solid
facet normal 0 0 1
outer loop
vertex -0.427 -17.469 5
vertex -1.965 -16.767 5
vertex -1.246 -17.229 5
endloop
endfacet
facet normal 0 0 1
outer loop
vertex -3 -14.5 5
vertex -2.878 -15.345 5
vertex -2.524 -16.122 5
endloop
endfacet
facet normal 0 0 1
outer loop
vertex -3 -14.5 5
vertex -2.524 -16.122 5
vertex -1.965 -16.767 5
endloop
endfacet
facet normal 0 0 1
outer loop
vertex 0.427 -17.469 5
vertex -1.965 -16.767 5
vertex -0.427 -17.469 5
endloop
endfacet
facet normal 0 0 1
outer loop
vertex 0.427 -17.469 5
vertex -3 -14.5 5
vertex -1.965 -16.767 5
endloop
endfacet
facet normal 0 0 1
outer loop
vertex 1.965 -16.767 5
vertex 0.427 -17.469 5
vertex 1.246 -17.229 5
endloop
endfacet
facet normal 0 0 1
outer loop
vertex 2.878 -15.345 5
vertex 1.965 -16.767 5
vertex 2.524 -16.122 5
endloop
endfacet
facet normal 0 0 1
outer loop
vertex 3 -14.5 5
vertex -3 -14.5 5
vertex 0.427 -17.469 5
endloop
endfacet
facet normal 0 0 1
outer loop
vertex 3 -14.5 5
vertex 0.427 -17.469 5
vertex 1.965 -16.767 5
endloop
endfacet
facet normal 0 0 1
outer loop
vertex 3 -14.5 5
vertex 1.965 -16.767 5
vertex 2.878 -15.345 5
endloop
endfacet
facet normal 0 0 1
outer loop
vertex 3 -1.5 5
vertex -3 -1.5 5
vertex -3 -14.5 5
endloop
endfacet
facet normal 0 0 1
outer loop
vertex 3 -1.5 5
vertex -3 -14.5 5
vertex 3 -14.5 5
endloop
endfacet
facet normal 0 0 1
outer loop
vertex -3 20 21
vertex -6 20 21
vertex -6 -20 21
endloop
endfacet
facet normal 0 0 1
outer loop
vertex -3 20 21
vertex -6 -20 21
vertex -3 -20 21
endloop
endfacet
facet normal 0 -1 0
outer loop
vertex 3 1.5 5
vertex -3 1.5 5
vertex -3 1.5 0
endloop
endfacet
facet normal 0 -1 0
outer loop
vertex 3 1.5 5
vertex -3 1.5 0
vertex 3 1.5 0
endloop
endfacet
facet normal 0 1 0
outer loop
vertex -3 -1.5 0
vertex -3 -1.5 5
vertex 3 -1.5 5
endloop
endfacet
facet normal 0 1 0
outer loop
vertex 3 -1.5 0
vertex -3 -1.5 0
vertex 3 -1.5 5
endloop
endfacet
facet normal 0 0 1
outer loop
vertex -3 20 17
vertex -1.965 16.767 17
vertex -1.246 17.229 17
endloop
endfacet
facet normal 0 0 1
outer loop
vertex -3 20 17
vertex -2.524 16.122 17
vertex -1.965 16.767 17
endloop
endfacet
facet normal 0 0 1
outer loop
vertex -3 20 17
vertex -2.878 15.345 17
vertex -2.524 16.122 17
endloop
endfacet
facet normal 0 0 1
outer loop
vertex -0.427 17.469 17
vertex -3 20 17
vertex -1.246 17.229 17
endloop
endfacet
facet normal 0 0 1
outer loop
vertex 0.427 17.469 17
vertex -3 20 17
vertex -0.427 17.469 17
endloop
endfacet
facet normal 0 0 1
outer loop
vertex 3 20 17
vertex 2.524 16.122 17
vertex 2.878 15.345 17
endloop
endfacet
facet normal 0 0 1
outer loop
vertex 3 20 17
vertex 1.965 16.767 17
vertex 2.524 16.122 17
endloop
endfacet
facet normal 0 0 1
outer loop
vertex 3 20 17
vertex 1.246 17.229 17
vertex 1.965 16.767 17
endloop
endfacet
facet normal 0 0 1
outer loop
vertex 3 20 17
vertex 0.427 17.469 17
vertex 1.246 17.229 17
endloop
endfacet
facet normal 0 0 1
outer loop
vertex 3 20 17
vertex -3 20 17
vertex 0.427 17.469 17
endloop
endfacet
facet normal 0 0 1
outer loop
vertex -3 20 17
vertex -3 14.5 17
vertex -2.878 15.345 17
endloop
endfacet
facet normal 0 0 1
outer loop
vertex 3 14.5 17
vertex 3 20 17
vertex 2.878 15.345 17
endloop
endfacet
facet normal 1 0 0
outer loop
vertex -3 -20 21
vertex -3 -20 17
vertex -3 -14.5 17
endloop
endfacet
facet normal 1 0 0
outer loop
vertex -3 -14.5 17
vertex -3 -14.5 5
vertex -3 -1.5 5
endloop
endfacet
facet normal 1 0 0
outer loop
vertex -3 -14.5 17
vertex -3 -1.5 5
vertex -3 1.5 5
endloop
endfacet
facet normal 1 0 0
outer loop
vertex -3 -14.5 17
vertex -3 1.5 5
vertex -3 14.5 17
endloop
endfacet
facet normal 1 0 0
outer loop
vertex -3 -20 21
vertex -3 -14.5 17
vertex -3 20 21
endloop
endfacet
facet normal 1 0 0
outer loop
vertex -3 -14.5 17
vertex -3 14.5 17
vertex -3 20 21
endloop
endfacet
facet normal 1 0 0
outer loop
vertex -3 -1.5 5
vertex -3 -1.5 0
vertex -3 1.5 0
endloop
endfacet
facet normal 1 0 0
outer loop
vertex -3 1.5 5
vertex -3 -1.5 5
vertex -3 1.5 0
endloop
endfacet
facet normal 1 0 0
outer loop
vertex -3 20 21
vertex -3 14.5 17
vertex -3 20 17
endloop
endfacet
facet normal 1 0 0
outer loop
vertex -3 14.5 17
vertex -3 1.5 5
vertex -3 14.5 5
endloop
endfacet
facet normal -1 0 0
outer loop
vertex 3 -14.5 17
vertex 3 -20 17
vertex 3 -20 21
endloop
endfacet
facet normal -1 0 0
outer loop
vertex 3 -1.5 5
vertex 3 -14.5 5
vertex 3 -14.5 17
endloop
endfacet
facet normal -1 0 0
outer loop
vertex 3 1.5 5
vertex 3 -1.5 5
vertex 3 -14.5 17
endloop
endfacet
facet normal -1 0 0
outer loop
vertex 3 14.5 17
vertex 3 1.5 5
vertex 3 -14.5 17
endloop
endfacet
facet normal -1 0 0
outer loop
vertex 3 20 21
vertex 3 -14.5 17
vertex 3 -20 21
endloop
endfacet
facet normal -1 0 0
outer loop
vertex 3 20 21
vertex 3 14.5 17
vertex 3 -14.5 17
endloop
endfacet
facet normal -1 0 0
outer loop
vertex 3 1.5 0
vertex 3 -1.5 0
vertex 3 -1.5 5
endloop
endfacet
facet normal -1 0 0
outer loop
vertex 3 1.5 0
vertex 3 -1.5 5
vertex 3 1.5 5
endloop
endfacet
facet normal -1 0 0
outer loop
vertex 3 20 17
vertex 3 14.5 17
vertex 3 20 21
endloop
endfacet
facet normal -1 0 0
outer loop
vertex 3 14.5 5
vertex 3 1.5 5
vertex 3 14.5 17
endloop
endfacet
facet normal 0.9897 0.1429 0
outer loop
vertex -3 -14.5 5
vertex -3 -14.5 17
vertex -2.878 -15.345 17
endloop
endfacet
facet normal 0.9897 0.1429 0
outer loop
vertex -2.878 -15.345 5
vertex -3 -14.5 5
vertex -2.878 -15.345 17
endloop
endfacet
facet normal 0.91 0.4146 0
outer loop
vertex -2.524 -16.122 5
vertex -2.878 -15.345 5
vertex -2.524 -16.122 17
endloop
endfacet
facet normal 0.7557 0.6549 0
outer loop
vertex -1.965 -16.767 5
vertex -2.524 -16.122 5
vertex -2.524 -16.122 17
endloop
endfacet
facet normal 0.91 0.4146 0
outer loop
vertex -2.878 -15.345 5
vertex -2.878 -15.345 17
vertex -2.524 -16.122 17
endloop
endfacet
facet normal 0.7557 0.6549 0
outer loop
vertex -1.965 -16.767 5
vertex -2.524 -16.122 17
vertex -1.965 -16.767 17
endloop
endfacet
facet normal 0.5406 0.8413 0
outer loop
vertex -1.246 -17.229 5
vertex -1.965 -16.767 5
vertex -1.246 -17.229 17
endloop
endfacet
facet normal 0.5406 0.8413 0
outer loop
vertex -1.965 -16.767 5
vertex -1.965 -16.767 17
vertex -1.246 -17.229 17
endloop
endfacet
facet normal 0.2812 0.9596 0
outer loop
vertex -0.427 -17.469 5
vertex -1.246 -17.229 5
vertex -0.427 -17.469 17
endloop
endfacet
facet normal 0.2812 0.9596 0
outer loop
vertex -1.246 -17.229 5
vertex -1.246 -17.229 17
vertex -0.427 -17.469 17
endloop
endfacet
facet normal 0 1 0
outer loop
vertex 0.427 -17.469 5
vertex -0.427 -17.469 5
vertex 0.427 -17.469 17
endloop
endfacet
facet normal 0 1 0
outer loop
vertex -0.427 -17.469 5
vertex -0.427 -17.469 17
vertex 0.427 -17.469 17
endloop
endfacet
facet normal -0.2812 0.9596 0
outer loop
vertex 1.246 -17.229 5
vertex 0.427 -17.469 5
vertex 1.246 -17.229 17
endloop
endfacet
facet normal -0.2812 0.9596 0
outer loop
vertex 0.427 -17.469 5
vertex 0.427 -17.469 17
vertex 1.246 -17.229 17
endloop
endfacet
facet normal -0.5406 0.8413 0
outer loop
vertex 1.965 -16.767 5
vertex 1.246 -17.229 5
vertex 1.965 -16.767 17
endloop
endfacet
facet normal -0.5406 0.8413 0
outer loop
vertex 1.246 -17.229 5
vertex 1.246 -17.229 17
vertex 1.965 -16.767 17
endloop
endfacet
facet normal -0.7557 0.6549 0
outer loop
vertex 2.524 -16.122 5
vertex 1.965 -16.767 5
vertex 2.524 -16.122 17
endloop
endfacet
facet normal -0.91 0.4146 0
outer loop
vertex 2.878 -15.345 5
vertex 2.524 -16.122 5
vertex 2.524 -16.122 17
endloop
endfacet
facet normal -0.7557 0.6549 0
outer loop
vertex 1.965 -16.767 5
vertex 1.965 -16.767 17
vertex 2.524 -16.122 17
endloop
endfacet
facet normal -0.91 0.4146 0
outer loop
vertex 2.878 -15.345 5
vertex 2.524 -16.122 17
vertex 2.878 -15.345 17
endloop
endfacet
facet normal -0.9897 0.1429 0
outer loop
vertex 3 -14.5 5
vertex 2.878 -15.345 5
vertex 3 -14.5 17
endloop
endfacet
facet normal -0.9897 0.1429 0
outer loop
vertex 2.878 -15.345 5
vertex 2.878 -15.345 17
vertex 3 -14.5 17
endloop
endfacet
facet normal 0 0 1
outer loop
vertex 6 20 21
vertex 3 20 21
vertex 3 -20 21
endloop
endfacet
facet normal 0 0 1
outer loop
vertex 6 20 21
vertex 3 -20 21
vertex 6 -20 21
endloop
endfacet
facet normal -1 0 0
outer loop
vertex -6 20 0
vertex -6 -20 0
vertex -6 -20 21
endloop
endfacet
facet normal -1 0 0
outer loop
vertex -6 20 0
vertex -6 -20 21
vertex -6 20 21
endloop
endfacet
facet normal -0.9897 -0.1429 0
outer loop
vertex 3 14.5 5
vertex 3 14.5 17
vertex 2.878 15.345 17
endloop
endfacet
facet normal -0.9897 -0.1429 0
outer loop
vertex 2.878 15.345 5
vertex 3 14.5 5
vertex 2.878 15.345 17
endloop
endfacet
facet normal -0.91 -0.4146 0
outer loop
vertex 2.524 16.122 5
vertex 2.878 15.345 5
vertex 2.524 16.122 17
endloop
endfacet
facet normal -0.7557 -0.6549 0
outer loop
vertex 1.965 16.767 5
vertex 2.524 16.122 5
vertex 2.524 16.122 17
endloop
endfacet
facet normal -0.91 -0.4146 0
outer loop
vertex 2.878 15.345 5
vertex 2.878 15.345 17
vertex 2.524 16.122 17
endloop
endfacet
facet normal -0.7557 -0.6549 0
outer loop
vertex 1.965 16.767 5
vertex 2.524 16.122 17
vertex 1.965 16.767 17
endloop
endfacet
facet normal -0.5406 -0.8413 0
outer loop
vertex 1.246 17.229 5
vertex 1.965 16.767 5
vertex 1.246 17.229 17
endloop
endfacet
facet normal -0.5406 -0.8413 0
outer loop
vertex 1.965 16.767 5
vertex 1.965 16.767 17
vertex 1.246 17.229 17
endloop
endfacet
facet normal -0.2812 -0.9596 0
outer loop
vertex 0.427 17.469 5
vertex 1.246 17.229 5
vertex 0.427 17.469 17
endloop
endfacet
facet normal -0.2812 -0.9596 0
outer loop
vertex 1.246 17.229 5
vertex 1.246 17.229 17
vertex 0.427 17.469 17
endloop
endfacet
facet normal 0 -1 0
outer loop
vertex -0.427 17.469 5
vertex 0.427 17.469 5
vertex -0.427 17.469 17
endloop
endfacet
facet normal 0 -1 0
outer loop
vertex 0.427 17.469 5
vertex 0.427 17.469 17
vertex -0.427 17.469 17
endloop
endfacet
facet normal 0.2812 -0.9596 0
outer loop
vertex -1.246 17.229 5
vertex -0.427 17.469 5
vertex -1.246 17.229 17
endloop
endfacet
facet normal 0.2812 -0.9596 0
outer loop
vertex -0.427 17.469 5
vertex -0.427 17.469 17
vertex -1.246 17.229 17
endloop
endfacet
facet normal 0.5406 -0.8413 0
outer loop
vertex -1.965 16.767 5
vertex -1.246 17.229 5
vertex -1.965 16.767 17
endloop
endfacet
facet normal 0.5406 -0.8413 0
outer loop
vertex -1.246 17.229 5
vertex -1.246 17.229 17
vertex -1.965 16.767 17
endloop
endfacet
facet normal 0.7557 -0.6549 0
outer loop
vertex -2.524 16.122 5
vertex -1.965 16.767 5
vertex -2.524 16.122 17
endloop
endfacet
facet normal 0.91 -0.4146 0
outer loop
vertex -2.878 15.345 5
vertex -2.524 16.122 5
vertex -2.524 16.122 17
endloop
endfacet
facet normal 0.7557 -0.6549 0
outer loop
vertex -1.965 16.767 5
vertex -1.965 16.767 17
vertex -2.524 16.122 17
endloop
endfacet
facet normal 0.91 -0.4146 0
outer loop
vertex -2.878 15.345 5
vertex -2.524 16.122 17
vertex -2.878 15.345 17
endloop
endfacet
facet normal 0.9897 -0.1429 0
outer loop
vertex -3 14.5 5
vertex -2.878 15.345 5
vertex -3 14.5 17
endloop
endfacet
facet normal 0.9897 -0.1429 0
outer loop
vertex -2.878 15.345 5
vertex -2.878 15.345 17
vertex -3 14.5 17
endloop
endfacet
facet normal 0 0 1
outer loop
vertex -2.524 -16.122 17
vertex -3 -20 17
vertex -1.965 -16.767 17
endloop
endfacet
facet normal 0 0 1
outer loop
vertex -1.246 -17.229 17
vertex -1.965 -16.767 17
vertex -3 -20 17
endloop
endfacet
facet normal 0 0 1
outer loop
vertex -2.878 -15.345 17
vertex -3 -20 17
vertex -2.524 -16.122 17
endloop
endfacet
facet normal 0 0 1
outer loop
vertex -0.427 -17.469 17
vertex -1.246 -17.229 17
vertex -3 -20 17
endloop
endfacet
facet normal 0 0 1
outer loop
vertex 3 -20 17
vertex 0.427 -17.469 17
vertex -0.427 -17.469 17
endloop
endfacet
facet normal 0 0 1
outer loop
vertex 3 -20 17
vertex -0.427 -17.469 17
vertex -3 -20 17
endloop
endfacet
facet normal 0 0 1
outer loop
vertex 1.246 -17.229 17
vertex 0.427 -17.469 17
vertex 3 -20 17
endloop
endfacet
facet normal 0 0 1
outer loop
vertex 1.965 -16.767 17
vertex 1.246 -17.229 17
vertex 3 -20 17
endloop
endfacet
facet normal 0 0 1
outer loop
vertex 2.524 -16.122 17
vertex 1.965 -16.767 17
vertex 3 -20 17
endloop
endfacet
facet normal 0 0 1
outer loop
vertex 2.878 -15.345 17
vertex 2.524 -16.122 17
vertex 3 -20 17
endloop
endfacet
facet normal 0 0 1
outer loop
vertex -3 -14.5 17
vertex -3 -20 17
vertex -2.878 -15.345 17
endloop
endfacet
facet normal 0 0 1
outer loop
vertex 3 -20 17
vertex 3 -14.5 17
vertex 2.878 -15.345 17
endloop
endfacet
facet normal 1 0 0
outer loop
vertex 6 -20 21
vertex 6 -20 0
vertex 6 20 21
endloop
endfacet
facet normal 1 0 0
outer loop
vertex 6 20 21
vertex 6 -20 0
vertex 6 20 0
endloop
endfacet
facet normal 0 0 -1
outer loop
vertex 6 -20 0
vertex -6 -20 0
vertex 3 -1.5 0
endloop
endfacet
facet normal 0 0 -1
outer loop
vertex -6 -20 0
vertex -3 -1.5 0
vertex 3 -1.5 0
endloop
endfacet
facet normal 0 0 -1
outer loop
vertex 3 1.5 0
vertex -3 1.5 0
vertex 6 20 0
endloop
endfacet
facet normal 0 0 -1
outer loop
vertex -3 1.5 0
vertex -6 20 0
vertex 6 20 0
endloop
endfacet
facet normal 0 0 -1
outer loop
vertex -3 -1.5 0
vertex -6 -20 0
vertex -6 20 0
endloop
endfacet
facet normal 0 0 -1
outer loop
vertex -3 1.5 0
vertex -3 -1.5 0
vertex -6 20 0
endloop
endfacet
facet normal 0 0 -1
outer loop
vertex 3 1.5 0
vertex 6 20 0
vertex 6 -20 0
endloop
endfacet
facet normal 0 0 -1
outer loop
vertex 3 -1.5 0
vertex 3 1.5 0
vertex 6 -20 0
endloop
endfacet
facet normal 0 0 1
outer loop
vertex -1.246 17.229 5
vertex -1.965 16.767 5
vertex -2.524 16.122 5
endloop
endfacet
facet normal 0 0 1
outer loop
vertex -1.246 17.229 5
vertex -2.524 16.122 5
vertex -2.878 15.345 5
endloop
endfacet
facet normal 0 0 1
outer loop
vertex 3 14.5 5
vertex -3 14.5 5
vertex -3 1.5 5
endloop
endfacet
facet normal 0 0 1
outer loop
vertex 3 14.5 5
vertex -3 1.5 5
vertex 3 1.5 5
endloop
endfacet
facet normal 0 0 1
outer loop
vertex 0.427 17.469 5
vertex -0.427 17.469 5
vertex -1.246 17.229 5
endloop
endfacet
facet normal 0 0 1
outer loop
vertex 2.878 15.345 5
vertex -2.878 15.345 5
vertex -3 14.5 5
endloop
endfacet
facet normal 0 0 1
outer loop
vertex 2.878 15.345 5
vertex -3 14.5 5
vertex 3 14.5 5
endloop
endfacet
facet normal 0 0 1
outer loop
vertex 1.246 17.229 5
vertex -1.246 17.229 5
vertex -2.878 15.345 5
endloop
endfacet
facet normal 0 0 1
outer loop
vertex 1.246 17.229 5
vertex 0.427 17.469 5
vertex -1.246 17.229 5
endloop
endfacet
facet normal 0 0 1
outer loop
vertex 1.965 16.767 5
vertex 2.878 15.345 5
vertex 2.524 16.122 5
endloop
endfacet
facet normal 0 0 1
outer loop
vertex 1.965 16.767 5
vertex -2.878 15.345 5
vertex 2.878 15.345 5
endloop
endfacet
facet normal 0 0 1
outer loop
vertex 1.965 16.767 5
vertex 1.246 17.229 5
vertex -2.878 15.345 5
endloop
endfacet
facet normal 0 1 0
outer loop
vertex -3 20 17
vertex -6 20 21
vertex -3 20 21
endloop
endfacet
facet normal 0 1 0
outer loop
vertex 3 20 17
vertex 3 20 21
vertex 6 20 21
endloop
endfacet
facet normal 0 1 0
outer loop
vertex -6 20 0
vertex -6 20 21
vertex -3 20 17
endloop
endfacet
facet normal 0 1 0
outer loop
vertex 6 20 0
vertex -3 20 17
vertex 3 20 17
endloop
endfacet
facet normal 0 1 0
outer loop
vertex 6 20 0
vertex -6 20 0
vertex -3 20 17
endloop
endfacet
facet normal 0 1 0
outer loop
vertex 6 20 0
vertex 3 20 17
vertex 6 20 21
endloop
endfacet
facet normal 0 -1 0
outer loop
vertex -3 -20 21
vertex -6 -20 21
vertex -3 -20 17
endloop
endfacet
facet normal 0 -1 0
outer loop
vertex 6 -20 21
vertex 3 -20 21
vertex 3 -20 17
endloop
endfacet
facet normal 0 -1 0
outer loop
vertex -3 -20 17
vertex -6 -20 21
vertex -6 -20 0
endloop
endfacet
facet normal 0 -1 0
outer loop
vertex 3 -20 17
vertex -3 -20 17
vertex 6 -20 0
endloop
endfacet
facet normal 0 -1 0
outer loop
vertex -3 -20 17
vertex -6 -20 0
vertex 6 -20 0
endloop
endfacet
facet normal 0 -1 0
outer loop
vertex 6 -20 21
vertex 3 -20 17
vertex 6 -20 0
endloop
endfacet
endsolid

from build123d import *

# Parameters (mm, degrees)
ESQUISSE1_W      = 12
ESQUISSE1_H      = 40
EXTRUSION1_DEPTH = 17
EXTRUSION2_DEPTH = 12
ESQUISSE3_W      = 6
ESQUISSE3_H      = 3
EXTRUSION3_DEPTH = 25.083189158
ESQUISSE4_W      = 3
ESQUISSE4_H      = 40
EXTRUSION4_DEPTH = 4


with BuildPart() as part:
    # Esquisse1 → Extrusion1 (new body)
    with BuildSketch(Plane.XY):
        Rectangle(ESQUISSE1_W, ESQUISSE1_H)
    extrude(amount=EXTRUSION1_DEPTH)

    # Esquisse2 → Extrusion2 (cut)
    with BuildSketch(Plane.XY.offset(17)):
        with BuildLine():
            Line((-3, 14.5), (-3, -14.5))
            ThreePointArc((-3, -14.5), (0, -17.5), (3, -14.5))
            Line((3, -14.5), (3, 14.5))
            ThreePointArc((3, 14.5), (0, 17.5), (-3, 14.5))
        make_face()
    extrude(amount=-EXTRUSION2_DEPTH, mode=Mode.SUBTRACT)

    # Esquisse3 → Extrusion3 (cut, through all)
    with BuildSketch(Plane.XY.offset(5)):
        Rectangle(ESQUISSE3_W, ESQUISSE3_H)
    extrude(amount=-EXTRUSION3_DEPTH, mode=Mode.SUBTRACT)

    # Esquisse4 → Extrusion4 (add)
    with BuildSketch(Plane.XY.offset(17)):
        with Locations((4.5, 0)):
            Rectangle(ESQUISSE4_W, ESQUISSE4_H)
        with Locations((-4.5, 0)):
            Rectangle(ESQUISSE4_W, ESQUISSE4_H)
    extrude(amount=EXTRUSION4_DEPTH)


solid = part.part
